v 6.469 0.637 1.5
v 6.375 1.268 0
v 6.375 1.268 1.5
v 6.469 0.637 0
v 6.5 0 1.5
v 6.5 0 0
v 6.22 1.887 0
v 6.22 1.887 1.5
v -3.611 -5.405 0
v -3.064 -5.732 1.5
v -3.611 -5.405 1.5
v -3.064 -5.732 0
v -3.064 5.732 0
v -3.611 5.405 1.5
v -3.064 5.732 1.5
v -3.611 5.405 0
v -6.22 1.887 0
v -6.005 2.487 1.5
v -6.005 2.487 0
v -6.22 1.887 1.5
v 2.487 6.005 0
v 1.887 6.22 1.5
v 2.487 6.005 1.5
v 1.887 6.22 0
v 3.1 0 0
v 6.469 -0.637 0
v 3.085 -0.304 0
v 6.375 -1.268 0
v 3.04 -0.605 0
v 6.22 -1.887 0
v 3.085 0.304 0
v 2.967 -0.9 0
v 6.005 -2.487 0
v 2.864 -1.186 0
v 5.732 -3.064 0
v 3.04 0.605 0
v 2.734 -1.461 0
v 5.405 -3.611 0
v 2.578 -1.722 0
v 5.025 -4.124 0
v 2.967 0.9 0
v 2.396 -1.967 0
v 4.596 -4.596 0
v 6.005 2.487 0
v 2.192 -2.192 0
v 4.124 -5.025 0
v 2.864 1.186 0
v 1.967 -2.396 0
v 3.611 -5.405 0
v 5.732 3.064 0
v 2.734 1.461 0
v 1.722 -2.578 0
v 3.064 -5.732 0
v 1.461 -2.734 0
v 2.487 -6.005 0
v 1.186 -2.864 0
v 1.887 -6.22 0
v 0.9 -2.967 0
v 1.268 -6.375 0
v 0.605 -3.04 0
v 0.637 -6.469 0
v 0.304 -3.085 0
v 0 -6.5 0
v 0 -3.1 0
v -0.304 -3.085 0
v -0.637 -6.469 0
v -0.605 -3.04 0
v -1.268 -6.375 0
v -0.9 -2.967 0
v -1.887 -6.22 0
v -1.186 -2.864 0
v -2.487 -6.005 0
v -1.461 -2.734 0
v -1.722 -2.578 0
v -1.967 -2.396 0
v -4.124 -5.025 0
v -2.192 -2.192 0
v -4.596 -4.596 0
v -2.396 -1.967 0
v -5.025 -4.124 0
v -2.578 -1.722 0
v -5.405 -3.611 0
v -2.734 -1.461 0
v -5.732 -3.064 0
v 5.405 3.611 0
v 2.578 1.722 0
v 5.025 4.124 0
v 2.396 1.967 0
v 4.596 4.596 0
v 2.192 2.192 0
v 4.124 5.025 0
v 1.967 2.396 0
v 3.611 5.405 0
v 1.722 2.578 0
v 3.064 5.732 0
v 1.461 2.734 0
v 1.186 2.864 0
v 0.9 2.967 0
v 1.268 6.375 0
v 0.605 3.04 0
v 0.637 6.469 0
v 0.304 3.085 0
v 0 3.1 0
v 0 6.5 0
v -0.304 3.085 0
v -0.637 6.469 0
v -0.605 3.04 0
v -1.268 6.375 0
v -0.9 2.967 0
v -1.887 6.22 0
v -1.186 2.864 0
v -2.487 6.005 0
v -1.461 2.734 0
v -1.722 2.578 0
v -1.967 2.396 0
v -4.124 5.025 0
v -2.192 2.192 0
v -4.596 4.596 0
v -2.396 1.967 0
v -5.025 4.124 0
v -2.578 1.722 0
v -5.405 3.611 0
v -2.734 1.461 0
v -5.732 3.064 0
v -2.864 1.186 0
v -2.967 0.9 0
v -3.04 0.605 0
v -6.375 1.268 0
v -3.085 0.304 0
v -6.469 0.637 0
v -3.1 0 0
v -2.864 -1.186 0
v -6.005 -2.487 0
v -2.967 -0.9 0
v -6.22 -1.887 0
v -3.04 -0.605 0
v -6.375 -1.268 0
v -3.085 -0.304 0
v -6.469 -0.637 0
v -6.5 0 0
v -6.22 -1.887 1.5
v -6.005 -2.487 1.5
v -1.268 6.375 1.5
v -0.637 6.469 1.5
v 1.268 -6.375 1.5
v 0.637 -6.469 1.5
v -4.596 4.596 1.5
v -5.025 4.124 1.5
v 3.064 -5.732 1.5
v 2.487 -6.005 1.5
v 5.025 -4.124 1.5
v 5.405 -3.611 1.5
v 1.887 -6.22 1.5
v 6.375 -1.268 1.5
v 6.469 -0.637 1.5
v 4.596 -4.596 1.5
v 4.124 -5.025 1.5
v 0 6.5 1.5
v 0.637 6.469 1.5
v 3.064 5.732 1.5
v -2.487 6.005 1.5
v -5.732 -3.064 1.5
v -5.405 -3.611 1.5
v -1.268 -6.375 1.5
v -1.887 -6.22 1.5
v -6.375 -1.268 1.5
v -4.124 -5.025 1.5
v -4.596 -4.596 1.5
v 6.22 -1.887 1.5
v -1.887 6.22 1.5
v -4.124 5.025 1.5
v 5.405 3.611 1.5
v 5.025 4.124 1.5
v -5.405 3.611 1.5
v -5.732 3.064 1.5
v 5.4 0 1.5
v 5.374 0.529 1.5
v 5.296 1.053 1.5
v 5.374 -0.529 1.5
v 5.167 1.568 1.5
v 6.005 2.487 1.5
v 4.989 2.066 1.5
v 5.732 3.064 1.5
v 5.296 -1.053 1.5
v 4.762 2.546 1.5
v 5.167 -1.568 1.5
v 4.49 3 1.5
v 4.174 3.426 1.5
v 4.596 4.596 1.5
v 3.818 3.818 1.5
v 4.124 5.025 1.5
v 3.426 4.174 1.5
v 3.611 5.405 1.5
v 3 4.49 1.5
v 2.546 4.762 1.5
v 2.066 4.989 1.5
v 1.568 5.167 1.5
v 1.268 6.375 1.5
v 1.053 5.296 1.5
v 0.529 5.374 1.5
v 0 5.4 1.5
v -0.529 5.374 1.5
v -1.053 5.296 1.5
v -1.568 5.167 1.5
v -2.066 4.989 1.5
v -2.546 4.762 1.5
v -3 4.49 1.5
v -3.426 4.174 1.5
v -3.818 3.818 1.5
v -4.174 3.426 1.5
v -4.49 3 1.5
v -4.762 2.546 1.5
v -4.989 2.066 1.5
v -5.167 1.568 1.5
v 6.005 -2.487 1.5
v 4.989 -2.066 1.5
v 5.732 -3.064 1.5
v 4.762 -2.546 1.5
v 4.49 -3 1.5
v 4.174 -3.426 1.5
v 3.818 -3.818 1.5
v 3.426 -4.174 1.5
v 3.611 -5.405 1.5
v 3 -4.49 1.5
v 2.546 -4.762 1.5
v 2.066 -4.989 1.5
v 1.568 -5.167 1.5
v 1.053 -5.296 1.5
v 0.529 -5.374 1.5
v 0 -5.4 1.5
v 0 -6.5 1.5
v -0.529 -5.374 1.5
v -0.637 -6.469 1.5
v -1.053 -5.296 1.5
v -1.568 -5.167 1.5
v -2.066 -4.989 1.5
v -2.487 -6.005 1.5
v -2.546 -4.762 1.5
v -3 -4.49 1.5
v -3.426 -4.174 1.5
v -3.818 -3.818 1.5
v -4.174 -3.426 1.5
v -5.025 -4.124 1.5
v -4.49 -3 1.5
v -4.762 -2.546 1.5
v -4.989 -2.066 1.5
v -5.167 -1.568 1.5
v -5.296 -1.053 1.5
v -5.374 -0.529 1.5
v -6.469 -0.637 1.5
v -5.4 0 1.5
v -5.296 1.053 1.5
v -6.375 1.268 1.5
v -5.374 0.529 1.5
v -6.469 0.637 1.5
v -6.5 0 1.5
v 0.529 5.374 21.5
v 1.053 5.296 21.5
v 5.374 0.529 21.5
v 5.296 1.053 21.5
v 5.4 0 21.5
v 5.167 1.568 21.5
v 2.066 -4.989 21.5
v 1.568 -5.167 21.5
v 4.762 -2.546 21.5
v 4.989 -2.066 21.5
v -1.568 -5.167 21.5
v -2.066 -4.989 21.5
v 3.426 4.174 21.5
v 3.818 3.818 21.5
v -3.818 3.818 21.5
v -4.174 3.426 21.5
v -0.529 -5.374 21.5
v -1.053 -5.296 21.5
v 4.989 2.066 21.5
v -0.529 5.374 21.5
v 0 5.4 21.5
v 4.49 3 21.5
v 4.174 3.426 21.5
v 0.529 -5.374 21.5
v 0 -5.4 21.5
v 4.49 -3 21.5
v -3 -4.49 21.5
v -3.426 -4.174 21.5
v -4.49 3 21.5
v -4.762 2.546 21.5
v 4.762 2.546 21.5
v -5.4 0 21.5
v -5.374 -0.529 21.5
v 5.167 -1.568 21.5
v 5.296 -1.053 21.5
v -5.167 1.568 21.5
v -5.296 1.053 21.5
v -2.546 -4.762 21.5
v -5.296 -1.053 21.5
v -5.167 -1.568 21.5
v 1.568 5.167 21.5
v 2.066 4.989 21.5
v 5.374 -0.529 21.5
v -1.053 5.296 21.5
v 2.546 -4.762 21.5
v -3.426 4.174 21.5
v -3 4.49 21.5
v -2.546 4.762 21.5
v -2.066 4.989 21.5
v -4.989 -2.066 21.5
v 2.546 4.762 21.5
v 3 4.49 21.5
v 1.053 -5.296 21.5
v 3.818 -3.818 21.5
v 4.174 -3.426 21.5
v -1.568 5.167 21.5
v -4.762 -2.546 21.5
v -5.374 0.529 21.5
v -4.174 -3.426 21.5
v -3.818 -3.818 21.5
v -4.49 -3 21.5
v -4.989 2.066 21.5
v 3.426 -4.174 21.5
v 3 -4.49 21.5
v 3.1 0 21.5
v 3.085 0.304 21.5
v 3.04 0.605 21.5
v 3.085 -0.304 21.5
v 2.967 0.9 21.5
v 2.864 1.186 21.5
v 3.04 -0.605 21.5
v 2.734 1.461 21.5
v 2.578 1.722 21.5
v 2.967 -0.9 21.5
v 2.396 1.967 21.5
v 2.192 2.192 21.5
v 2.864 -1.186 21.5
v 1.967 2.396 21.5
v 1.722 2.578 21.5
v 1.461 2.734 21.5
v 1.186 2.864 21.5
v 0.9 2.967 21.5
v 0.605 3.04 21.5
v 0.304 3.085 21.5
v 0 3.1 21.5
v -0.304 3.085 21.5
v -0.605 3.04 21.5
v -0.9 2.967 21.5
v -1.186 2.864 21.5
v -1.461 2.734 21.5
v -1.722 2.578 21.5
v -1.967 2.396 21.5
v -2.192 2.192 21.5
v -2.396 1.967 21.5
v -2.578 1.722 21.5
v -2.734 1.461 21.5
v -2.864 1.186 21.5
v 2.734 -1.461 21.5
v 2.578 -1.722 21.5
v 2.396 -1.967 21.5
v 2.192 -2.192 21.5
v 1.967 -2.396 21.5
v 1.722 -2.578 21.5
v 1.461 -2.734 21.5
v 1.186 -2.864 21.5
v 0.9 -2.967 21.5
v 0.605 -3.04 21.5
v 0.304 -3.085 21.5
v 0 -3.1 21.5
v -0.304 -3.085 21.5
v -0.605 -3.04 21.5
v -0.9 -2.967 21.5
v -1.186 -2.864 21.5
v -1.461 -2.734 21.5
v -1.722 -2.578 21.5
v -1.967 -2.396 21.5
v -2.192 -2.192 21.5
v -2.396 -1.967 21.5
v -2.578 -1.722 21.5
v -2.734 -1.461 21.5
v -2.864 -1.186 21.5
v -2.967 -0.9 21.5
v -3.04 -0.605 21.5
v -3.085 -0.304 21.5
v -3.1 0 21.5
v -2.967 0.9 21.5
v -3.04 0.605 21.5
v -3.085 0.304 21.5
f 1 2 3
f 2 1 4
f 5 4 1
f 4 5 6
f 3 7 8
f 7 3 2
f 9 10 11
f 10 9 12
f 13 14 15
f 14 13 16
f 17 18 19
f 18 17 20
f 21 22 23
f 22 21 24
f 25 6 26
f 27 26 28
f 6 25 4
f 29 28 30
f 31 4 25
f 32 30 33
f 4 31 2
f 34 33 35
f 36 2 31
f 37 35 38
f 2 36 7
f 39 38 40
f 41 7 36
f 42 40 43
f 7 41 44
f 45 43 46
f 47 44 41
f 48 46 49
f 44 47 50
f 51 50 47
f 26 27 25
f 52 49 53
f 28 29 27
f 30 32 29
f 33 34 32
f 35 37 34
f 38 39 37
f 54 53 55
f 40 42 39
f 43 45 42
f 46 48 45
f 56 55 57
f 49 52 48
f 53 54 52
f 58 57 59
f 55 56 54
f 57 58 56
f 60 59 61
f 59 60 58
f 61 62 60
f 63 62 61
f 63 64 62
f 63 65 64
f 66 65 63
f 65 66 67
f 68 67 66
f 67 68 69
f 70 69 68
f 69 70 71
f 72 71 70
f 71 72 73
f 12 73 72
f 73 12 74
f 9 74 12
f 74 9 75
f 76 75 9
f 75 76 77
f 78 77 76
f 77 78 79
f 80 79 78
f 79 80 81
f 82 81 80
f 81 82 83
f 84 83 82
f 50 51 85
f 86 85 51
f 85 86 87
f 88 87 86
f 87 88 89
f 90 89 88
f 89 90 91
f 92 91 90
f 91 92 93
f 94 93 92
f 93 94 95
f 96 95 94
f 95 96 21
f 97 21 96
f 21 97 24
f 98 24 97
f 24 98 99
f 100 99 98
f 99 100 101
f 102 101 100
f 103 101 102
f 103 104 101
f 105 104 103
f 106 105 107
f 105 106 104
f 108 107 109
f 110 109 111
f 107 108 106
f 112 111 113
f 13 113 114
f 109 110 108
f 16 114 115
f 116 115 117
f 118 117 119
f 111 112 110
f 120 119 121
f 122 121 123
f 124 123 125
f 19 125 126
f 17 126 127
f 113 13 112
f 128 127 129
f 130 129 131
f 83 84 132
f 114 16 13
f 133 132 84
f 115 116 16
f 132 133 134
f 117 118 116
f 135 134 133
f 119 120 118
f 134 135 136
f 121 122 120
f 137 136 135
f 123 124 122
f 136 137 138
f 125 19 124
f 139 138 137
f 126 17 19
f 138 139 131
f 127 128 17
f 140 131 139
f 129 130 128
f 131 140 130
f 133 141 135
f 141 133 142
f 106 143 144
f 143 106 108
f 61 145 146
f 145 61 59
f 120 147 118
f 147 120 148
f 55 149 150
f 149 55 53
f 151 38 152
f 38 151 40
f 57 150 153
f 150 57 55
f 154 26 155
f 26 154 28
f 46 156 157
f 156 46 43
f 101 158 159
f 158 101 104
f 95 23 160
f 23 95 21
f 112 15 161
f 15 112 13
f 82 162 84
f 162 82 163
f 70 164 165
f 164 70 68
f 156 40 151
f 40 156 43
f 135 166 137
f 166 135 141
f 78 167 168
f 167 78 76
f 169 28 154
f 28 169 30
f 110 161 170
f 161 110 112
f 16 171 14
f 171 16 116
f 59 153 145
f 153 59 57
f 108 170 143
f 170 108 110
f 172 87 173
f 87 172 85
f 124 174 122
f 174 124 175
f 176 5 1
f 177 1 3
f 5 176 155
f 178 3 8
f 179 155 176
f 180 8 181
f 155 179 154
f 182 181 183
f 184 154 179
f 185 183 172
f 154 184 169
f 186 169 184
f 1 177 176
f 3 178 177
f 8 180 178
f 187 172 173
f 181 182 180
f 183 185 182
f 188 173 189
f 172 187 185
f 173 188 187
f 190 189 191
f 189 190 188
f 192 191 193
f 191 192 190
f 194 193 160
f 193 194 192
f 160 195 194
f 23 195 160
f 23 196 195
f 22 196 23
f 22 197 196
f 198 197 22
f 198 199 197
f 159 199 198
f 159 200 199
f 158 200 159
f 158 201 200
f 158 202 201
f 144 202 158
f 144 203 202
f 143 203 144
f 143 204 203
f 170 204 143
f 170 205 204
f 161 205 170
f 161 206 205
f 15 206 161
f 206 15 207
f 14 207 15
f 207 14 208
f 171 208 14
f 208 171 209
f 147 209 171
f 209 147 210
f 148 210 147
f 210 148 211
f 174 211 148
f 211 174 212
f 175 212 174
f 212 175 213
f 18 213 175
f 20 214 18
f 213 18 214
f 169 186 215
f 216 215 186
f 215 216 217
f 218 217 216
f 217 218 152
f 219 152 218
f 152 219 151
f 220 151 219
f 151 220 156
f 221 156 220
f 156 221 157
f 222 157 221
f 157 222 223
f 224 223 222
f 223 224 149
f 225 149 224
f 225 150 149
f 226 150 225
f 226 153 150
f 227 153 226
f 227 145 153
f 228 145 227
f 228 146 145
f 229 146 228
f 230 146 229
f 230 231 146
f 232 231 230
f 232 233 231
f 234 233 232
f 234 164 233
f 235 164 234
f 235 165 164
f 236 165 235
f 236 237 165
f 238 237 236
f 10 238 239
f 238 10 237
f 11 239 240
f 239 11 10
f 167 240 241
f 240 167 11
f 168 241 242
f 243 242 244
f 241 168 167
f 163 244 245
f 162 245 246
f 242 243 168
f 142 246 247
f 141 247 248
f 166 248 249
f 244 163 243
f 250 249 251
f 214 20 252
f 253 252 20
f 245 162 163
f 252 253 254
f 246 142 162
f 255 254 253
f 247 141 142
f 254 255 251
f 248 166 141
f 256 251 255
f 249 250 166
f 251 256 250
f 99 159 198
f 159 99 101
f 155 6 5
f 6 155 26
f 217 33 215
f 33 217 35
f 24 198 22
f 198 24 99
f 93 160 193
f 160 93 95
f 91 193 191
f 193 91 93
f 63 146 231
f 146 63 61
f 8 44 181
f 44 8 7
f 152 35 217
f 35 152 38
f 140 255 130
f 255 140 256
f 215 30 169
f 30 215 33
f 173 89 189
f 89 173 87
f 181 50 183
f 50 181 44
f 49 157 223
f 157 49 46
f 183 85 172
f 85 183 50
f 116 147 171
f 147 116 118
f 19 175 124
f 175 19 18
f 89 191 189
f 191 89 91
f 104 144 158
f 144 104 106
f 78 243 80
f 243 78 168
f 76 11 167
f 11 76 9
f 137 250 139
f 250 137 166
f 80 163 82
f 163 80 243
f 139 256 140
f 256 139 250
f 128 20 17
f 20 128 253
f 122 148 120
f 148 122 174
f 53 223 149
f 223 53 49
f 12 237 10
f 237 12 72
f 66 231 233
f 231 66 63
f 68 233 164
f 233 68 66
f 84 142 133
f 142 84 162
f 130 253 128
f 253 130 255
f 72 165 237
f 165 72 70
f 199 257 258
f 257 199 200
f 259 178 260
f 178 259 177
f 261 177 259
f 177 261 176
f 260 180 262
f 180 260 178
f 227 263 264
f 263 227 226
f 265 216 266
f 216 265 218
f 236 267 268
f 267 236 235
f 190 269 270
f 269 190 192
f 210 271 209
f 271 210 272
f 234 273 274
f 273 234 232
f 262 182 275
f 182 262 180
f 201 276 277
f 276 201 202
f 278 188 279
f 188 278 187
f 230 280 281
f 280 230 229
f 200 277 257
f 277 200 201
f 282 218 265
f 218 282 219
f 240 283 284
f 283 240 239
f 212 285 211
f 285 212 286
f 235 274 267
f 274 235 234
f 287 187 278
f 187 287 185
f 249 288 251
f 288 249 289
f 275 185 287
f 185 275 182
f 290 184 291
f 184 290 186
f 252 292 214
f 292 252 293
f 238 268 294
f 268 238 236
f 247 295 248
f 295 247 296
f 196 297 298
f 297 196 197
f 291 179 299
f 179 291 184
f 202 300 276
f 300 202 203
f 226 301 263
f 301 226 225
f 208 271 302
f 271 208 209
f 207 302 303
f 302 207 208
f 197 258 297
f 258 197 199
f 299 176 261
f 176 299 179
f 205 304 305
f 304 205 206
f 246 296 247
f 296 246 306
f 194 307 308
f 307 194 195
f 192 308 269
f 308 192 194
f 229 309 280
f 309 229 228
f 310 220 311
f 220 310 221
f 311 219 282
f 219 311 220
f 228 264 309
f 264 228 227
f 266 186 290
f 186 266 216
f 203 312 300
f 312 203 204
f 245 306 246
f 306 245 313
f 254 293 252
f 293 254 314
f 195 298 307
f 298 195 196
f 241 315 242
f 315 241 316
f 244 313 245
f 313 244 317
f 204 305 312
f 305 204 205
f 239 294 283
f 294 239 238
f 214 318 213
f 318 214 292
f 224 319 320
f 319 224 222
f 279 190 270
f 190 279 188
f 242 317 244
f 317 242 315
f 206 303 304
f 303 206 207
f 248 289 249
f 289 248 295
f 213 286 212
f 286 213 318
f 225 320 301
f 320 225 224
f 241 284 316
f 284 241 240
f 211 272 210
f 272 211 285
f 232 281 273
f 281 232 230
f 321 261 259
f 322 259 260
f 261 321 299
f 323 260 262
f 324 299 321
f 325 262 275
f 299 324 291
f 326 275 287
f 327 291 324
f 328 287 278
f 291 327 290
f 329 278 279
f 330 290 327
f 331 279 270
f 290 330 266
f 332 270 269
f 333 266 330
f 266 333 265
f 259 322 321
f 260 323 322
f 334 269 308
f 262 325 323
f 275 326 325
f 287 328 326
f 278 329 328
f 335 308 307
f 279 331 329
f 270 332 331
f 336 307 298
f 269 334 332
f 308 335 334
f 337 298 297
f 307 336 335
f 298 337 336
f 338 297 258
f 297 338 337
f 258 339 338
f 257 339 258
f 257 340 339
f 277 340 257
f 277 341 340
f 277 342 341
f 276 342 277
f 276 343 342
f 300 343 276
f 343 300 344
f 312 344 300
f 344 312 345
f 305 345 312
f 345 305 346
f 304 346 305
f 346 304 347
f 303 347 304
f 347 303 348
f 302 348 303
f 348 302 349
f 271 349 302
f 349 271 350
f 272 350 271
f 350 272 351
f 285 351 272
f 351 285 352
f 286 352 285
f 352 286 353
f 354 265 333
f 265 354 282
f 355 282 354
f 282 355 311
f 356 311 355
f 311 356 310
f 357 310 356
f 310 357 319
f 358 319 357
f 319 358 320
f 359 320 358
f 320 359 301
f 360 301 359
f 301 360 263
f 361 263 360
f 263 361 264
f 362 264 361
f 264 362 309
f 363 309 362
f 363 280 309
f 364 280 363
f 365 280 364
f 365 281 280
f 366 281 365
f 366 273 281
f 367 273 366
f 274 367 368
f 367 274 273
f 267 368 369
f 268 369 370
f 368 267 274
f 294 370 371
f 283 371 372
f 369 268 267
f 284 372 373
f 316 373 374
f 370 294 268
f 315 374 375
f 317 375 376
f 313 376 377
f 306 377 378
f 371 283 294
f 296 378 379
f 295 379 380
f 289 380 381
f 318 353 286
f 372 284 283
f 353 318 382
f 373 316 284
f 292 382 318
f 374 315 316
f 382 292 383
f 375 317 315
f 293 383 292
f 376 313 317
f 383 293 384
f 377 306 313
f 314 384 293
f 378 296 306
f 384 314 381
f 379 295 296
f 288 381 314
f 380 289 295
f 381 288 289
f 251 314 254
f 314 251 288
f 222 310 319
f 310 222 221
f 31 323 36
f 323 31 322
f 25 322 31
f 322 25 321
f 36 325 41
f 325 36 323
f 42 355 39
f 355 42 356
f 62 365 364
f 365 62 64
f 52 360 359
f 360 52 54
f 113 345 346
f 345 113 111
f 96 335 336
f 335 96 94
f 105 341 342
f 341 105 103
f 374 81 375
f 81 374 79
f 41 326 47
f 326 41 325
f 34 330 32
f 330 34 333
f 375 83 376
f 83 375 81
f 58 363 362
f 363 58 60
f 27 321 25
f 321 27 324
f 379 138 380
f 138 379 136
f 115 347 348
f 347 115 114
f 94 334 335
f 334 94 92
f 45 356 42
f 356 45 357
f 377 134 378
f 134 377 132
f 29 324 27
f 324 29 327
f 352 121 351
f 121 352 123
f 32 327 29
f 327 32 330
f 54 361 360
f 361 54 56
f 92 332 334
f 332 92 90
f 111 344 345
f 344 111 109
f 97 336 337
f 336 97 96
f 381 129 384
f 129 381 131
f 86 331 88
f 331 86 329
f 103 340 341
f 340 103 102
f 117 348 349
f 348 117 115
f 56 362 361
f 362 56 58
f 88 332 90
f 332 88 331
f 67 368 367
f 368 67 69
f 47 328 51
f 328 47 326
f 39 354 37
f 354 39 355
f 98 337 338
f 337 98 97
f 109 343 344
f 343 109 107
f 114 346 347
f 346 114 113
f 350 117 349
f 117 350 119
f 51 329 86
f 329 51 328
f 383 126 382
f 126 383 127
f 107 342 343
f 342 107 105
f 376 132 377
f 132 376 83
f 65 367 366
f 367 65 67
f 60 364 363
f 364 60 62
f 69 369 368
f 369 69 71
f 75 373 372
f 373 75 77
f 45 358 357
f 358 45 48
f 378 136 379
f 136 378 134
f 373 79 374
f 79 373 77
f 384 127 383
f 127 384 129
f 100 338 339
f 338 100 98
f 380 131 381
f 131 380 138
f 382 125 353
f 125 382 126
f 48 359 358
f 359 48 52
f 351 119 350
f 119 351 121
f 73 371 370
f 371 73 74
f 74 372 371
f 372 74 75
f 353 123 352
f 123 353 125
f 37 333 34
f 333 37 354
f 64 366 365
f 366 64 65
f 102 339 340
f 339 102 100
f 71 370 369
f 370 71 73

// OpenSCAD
// PCR tube adapter sleeve: fits a 0.2 mL tube into a 1.5 mL rack hole
// Print orientation: collar on the bed (z = 0), sleeve body rises to z = 21.5

$fn = 64;

// ---- Dimensions (mm) ----
collar_d      = 13;    // collar outer diameter
collar_h      = 1.5;   // collar thickness (z = 0 to 1.5)
sleeve_od     = 10.8;  // sleeve body outer diameter
sleeve_top_z  = 21.5;  // top of sleeve body
bore_d        = 6.2;   // through-bore diameter

eps           = 0.5;   // cutter overshoot past faces

// ---- Model ----
difference() {
    union() {
        // Collar
        cylinder(d = collar_d, h = collar_h);
        // Sleeve body (slightly overlapping the collar for a clean union)
        translate([0, 0, collar_h - 0.01])
            cylinder(d = sleeve_od, h = sleeve_top_z - collar_h + 0.01);
    }
    // Straight through-bore
    translate([0, 0, -eps])
        cylinder(d = bore_d, h = sleeve_top_z + 2 * eps);
}
